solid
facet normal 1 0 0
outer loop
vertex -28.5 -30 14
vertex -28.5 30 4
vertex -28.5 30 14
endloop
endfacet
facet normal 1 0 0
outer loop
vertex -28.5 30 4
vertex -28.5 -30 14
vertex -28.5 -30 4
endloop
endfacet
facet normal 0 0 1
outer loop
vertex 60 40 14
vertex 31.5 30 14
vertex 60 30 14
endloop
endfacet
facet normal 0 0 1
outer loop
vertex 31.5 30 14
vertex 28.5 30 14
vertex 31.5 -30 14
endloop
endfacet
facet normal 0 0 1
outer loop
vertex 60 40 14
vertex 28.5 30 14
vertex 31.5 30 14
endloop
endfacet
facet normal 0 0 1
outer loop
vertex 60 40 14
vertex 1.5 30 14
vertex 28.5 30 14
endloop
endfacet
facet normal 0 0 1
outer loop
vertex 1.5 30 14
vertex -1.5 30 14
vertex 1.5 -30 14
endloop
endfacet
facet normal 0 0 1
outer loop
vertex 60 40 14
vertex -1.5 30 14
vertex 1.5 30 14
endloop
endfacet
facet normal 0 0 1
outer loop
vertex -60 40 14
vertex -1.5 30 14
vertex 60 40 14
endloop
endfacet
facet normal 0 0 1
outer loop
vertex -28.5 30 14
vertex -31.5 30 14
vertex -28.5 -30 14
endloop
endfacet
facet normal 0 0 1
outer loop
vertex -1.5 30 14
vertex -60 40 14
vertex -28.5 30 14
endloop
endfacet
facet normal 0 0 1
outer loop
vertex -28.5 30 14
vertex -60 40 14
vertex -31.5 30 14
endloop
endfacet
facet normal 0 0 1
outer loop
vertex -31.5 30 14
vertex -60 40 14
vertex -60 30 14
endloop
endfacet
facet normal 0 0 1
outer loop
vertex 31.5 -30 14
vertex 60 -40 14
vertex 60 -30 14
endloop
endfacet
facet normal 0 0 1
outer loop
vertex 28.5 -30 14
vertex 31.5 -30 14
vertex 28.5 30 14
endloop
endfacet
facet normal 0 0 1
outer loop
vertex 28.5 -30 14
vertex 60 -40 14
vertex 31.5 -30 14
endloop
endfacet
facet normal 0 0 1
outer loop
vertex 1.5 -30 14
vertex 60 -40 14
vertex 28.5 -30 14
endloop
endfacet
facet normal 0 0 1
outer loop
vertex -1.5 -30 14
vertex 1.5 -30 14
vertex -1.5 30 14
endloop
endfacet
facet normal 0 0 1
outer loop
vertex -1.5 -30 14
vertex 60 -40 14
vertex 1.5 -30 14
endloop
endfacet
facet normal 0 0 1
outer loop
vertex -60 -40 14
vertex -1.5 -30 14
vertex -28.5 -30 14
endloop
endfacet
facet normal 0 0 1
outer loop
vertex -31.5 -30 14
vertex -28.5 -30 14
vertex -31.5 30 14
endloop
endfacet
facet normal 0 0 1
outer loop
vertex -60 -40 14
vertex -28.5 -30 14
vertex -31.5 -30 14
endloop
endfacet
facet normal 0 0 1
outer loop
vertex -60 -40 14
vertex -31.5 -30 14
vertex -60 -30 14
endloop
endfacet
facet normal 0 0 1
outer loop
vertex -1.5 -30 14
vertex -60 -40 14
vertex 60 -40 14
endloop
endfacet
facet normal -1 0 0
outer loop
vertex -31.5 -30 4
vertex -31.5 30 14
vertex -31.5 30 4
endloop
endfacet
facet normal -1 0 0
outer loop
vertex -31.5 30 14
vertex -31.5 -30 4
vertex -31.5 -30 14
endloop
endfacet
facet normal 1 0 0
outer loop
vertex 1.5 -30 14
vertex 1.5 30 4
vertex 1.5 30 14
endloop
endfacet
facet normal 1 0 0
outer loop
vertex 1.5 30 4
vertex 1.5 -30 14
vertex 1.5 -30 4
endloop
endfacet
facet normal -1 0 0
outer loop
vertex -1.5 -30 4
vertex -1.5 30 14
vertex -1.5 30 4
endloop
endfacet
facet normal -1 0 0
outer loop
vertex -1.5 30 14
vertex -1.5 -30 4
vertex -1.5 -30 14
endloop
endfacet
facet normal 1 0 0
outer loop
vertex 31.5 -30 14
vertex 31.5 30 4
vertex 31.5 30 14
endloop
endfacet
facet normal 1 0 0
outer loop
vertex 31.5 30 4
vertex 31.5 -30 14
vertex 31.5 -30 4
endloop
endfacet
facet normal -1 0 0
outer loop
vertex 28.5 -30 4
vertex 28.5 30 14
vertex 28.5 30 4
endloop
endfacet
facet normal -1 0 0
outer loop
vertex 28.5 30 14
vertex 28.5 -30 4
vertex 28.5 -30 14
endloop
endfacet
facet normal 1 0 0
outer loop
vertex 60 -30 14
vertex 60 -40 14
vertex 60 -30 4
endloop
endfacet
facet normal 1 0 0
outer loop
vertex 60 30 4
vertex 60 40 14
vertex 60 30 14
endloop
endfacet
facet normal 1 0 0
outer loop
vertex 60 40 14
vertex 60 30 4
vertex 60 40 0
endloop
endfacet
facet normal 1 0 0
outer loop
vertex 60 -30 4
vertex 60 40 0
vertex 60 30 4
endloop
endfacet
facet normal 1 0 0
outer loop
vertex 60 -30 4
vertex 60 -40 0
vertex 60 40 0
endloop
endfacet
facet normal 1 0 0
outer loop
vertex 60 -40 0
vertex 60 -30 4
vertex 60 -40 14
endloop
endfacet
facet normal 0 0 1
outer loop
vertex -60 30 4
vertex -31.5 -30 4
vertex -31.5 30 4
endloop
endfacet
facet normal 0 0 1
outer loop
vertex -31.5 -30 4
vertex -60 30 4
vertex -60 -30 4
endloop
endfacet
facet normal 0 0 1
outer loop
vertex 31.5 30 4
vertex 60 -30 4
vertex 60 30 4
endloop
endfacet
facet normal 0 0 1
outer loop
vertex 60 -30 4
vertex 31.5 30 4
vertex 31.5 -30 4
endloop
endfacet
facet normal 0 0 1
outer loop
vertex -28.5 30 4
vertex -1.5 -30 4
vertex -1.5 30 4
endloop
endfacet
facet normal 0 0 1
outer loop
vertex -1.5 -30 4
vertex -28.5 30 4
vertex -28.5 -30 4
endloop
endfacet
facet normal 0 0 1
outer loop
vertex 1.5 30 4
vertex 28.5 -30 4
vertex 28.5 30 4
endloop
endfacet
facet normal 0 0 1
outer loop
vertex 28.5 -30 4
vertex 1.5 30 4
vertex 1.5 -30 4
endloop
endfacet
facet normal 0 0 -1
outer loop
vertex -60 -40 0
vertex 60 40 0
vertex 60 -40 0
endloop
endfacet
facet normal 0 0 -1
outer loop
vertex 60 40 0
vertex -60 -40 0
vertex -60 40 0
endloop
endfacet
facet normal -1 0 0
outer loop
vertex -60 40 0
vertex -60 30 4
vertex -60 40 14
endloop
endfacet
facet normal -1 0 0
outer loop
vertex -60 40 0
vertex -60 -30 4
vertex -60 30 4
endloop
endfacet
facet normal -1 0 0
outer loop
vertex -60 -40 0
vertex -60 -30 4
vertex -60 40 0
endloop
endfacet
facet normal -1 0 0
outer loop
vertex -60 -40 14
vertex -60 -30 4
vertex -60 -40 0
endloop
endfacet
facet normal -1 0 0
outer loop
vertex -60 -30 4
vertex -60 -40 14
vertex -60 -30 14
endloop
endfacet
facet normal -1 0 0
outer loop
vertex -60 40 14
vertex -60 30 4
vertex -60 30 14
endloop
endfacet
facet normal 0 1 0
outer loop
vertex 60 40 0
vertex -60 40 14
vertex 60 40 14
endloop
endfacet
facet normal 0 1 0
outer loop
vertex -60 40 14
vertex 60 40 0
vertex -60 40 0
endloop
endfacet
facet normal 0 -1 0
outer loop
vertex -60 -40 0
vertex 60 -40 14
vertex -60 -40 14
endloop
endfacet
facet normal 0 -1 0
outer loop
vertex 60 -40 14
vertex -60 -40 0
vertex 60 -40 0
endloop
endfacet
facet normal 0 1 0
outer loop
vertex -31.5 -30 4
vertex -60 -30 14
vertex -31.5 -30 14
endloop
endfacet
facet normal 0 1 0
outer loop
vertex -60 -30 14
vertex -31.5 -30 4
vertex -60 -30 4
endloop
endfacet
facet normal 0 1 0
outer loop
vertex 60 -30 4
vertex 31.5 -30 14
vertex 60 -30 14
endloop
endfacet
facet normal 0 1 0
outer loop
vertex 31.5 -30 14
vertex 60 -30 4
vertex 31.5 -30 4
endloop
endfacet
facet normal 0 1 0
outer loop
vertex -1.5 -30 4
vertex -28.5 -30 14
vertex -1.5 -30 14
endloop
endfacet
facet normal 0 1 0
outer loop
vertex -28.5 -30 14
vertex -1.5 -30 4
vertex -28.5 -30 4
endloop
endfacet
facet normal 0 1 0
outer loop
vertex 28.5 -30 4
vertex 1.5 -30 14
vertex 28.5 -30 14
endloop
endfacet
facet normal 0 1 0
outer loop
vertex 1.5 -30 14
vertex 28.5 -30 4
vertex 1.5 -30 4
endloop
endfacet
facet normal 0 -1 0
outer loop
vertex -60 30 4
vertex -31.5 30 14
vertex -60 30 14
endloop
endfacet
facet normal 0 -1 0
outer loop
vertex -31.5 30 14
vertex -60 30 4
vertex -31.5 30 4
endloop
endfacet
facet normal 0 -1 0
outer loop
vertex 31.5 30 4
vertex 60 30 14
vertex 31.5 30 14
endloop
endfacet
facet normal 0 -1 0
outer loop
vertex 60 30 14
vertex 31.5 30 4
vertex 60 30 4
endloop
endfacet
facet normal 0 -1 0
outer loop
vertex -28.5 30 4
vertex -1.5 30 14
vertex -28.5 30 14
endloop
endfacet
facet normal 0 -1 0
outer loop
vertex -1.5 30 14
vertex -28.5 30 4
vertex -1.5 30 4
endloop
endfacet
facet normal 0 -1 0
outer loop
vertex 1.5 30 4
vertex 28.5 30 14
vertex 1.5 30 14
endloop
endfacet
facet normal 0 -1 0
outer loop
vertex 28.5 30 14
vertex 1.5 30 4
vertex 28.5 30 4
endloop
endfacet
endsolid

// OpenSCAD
$fn = 32;

// ----------------------------------------------------------------------
// Rib frame 120 x 80 x 14
// 3 ribs at 30 mm pitch
// ----------------------------------------------------------------------

// --- parameters (mm) ---
frame = [120, 80, 4];  // base plate size (x, y, z)
rail_w = 10;           // side rail width
ribs = 3;              // number of ribs
rib_t = 3;             // rib thickness
rib_h = 10;            // rib height above the base plate
pitch = 30;            // pitch between rib centres

// --- derived feature positions (mm) ---
span = (ribs - 1) * pitch;          // = 60   distance between the outer ribs
origin_x = -span / 2;               // = -30   X of the first rib
rib_len = frame[1] - 2 * rail_w + 2;  // = 62   rib length, 1 mm into each rail
feature_centers = [
  [origin_x + 0 * pitch, 0],
  [origin_x + 1 * pitch, 0],
  [origin_x + 2 * pitch, 0]
];   // rib centre line, drives the rib loop

// base plate, two side rails, then the ribs read straight off feature_centers
union() {
  translate([-frame[0] / 2, -frame[1] / 2, 0]) cube(frame);
  translate([-frame[0] / 2, -frame[1] / 2, 0]) cube([frame[0], rail_w, frame[2] + rib_h]);
  translate([-frame[0] / 2, frame[1] / 2 - rail_w, 0]) cube([frame[0], rail_w, frame[2] + rib_h]);
  for (centre = feature_centers)
    translate([centre[0] - rib_t / 2, centre[1] - rib_len / 2, frame[2] - 1])
      cube([rib_t, rib_len, rib_h + 1]);
}
